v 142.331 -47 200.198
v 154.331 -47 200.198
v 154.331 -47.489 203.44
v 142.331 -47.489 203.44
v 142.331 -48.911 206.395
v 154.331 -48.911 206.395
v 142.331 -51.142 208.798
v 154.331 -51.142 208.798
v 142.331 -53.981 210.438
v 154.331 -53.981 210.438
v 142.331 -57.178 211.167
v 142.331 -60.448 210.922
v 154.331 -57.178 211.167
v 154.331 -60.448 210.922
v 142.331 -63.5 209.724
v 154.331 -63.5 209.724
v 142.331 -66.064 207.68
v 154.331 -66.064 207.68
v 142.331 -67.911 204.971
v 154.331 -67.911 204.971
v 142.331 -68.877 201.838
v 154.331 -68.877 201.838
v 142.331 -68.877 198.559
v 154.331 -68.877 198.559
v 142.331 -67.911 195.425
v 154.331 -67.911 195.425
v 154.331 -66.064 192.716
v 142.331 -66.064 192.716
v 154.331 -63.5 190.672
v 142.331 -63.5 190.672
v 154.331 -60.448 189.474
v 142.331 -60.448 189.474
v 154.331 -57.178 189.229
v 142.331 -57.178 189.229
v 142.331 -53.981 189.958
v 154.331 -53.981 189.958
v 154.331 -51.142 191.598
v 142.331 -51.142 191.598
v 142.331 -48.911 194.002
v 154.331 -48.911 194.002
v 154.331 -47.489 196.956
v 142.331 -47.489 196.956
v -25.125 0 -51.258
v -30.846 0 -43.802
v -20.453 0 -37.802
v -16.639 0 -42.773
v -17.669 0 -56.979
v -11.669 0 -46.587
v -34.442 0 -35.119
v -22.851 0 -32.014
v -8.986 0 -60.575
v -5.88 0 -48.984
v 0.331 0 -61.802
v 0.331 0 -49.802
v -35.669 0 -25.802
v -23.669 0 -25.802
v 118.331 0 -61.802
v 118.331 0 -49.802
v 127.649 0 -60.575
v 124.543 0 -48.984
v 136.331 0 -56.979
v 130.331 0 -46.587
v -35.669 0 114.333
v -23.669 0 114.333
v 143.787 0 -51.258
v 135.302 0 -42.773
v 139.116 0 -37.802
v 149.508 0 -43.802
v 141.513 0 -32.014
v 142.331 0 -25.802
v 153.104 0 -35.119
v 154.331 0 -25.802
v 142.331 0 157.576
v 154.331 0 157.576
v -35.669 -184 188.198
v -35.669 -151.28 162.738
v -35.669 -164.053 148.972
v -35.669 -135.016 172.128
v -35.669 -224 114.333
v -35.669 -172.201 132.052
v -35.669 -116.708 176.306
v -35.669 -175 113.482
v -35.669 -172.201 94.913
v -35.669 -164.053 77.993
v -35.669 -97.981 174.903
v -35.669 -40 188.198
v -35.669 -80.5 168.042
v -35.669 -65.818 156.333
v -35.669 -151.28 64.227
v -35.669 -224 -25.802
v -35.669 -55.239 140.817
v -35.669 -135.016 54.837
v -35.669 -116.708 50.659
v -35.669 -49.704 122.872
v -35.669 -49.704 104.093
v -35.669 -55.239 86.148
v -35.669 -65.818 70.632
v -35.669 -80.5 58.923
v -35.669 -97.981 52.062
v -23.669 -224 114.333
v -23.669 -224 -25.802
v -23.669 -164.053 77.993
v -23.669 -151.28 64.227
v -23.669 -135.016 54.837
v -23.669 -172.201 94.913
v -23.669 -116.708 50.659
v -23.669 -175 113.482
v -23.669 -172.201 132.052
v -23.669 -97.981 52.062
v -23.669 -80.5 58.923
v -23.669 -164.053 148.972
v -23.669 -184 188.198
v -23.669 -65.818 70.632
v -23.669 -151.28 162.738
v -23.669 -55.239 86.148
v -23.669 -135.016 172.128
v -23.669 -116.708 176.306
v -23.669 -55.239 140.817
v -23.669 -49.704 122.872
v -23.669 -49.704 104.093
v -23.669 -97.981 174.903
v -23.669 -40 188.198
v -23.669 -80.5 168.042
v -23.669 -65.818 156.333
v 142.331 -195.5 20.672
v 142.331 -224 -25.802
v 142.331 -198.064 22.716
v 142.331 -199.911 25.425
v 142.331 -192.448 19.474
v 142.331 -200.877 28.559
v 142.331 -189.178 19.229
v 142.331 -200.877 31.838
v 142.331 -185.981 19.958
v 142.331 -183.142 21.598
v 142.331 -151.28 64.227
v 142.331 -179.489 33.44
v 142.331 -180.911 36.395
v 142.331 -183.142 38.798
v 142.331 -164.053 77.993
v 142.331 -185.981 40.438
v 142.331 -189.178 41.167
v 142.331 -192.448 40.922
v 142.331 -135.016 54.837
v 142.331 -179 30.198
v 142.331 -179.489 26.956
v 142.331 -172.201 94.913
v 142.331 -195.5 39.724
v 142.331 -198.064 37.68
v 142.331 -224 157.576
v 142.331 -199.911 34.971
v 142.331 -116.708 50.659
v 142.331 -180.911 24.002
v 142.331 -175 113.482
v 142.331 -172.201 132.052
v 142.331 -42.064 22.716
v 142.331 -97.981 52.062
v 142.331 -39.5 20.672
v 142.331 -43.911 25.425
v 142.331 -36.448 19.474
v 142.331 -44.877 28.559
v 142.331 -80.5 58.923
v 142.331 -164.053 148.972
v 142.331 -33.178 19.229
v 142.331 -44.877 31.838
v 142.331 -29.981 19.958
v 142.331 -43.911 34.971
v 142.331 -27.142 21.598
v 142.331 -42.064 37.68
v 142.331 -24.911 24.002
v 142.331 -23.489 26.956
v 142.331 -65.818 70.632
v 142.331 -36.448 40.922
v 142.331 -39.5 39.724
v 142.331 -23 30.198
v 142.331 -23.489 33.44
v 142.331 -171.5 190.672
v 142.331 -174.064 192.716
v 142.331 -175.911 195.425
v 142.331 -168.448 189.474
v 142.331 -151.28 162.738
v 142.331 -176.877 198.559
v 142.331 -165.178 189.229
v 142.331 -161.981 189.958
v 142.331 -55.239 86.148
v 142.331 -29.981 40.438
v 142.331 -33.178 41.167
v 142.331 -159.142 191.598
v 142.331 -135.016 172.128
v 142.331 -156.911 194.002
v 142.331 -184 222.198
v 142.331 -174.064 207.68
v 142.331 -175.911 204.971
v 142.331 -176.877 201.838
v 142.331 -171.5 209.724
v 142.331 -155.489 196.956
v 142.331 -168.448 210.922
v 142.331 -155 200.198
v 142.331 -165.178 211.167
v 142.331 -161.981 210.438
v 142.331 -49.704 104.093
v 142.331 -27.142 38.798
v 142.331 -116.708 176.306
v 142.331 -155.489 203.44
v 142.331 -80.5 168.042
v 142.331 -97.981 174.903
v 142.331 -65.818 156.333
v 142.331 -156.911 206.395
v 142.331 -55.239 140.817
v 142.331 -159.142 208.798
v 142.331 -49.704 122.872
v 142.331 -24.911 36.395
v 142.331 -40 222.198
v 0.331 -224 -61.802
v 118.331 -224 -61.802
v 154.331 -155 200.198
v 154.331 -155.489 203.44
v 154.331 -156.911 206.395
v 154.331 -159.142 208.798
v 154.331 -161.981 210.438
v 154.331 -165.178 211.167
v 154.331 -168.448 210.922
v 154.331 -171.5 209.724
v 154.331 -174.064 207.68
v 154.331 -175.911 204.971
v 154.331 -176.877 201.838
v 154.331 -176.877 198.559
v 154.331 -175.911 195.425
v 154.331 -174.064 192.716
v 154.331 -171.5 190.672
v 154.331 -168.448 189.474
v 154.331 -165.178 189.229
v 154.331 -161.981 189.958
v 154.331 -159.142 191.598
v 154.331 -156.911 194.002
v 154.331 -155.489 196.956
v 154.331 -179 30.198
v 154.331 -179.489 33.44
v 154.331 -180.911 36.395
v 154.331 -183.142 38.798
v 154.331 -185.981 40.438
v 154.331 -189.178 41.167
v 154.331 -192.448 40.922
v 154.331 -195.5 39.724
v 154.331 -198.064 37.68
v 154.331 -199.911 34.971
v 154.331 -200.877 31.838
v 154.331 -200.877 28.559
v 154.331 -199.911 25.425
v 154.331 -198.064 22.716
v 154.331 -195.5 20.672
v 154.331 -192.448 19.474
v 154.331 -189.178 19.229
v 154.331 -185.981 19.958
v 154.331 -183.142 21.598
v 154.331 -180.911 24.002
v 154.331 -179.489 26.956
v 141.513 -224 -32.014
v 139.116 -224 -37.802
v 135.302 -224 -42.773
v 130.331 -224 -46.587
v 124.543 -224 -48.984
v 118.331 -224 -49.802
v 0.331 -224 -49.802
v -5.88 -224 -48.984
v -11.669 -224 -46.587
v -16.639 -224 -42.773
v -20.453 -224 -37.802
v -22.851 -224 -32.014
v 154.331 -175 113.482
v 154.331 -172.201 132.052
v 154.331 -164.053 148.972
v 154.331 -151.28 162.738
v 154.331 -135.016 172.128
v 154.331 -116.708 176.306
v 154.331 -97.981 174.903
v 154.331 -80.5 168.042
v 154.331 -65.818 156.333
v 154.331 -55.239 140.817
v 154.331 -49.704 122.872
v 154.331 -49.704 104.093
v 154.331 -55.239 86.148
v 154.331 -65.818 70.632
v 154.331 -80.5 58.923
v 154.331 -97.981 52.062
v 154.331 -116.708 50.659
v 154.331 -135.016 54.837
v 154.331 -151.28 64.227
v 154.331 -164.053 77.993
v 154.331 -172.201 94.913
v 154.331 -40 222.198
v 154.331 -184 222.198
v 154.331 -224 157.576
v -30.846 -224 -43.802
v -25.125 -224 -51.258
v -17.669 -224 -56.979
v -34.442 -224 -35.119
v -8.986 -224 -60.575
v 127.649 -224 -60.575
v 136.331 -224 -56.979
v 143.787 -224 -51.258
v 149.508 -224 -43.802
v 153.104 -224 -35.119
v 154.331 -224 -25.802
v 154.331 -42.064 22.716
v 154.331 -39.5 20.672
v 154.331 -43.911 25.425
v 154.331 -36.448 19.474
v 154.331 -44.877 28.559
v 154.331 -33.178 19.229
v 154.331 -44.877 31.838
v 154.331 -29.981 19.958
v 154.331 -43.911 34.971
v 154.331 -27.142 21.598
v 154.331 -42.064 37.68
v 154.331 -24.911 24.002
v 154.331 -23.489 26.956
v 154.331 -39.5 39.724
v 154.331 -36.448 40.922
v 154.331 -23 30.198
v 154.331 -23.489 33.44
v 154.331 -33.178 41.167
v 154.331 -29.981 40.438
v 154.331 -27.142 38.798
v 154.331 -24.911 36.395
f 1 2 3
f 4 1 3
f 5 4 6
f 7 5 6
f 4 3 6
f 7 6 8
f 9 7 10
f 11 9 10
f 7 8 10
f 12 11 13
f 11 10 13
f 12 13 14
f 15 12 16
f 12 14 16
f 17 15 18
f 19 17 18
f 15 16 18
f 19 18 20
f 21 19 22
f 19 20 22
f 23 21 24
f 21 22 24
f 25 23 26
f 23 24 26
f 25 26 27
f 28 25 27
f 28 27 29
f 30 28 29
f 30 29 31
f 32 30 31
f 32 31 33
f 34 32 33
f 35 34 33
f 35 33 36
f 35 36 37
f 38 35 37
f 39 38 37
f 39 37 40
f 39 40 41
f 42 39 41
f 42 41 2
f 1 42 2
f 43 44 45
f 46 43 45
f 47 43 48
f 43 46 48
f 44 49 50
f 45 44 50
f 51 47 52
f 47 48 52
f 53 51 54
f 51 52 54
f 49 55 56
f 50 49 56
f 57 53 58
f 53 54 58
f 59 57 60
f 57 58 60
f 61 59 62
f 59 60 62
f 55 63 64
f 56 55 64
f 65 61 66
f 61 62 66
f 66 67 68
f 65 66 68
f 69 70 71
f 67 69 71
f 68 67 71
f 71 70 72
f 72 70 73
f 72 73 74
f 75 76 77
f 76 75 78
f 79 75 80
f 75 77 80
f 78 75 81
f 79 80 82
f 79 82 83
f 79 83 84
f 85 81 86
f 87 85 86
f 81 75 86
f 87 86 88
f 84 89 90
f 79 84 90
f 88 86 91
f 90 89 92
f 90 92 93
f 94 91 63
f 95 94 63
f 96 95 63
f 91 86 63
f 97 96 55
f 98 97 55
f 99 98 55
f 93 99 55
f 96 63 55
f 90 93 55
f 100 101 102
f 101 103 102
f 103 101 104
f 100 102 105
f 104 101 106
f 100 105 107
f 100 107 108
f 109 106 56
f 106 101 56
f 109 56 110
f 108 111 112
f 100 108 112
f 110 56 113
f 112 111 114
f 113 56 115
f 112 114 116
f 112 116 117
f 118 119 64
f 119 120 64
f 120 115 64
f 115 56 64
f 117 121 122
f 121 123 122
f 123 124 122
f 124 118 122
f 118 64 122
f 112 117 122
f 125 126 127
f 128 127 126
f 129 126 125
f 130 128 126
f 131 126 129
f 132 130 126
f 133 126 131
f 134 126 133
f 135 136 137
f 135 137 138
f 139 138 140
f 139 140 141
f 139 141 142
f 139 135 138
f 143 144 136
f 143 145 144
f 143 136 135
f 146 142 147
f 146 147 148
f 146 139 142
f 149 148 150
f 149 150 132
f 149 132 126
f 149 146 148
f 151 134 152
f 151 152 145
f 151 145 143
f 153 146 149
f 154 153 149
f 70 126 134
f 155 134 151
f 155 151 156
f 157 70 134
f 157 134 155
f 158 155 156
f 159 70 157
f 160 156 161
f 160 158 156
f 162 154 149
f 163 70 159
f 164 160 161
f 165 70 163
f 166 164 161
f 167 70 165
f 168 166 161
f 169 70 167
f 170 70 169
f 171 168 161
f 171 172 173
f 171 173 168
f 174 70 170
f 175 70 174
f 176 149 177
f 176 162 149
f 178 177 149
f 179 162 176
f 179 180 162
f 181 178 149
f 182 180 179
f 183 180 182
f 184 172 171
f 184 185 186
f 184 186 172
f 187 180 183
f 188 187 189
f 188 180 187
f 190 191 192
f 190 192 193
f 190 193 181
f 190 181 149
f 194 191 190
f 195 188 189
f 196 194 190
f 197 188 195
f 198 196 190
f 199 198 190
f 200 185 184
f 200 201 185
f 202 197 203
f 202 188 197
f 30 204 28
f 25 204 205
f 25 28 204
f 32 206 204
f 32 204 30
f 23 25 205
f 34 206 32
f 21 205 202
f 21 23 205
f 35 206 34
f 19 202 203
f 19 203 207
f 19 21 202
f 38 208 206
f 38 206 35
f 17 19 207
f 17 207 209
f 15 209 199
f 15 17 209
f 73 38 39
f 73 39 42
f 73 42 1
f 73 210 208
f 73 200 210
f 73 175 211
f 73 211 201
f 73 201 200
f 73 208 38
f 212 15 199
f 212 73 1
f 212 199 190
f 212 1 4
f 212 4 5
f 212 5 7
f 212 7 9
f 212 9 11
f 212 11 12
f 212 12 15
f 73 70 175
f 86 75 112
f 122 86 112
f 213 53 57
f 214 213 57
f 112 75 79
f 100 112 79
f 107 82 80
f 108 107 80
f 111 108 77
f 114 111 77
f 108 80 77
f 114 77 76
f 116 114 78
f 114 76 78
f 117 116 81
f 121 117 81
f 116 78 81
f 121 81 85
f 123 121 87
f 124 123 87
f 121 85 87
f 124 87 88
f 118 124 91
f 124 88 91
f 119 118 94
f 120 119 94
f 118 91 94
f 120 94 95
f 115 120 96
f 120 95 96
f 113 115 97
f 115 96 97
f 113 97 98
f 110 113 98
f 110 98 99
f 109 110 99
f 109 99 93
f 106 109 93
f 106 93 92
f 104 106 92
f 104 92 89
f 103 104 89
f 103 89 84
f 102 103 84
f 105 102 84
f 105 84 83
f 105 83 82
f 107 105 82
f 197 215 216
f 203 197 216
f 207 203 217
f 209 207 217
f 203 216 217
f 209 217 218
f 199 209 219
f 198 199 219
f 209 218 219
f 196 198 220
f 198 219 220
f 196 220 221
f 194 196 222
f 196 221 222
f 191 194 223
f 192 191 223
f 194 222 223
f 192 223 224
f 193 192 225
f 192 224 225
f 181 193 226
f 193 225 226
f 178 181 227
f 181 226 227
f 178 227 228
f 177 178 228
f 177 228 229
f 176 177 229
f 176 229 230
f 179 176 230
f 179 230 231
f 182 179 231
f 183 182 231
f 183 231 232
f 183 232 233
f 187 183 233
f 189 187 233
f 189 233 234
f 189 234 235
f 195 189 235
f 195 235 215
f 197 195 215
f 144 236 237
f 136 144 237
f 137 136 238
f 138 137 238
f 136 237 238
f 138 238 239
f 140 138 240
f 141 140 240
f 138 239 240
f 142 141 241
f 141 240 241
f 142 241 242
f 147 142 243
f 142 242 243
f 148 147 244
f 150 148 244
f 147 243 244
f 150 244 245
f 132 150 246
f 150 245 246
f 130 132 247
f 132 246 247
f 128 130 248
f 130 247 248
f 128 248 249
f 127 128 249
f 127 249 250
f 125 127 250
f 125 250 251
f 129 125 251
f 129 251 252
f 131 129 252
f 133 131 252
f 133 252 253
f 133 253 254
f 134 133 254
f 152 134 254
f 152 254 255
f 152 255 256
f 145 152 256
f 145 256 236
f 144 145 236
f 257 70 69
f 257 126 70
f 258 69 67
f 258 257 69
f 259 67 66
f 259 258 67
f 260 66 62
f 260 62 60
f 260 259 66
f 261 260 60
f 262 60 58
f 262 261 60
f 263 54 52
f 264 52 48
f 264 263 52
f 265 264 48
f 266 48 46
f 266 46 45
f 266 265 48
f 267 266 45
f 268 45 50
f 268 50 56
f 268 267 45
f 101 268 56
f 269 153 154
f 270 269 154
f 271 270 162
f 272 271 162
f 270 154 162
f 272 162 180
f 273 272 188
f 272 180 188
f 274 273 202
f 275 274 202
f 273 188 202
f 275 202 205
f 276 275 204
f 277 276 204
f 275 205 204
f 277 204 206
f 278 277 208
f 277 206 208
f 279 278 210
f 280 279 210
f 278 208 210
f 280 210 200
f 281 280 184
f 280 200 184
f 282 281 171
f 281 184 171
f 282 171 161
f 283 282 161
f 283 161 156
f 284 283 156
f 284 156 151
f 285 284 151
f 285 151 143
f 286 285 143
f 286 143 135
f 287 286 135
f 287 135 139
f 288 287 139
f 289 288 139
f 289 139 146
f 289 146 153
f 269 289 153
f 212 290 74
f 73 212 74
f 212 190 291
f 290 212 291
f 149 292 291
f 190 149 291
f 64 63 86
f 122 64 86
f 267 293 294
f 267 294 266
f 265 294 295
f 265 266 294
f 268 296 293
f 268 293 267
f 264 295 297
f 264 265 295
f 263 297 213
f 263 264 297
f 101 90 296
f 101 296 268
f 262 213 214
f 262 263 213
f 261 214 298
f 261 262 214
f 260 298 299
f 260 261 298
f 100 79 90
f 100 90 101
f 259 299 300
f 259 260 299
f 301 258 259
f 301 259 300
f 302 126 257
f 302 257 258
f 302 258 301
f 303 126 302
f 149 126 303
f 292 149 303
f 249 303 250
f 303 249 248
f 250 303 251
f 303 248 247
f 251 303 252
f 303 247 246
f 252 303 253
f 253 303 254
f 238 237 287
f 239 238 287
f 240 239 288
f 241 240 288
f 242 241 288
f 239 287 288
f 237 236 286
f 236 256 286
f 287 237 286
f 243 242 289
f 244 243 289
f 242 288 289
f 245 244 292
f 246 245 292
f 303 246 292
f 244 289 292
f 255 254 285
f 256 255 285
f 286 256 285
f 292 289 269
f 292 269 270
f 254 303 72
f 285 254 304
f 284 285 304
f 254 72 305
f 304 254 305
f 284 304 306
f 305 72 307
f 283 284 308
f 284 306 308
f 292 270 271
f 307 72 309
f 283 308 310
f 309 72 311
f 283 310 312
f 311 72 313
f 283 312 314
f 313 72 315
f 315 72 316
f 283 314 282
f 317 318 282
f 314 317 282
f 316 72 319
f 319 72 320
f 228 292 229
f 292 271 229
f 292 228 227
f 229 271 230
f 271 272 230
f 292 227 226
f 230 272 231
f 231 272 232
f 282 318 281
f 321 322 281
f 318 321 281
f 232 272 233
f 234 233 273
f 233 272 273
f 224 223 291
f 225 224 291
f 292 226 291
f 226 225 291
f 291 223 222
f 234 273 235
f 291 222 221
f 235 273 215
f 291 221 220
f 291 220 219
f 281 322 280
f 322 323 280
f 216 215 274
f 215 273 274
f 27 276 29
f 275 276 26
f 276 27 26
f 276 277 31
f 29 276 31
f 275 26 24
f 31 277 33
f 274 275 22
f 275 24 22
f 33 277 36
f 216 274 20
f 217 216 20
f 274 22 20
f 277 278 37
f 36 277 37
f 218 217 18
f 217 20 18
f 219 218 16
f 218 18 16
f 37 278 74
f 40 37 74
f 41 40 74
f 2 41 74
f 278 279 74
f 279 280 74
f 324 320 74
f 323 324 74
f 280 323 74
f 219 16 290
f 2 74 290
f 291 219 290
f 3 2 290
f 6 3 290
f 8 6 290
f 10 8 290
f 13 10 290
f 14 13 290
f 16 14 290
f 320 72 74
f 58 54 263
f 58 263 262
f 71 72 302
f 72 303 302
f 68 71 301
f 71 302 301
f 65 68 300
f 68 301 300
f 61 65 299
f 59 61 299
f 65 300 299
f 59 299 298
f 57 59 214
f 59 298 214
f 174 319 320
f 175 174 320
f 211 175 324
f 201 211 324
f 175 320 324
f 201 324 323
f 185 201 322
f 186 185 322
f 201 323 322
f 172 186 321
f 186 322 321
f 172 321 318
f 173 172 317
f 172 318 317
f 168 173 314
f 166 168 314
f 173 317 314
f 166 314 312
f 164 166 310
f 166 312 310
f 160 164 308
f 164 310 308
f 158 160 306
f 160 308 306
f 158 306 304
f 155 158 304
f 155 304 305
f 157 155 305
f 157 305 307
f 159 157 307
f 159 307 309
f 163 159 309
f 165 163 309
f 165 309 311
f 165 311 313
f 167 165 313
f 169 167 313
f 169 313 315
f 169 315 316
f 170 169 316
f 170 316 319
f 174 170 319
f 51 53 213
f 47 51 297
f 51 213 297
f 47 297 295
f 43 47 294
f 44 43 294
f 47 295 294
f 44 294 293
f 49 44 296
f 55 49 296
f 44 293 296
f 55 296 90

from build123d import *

# Parameters (mm, degrees)
F0_W      = 12
F0_H      = 238
F0_H_2    = 12
F0_W_2    = 166
F0_H_3    = 272
F1_DEPTH  = 224
F2_R      = 24
F3_R      = 36
F5_DEPTH  = 12
F7_DEPTH  = 12
F8_R      = 63
F9_DEPTH  = 190
F10_R     = 11
F11_DEPTH = 25


with BuildPart() as f1:
    # F0 (on Front) → F1 (new body)
    with BuildSketch(Plane.XZ):
        with Locations((-29.668833, 69.198049)):
            Rectangle(F0_W, F0_H)
        with Locations((-29.668833, -55.801951)):
            Rectangle(F0_W, F0_H_2)
        with Locations((59.331167, -55.801951)):
            Rectangle(F0_W_2, F0_H_2)
        with Locations((148.331167, 86.198049)):
            Rectangle(F0_W, F0_H_3)
        with Locations((148.331167, -55.801951)):
            Rectangle(F0_W, F0_H_2)
    extrude(amount=F1_DEPTH)

    # F2
    f2_edges = [f1.edges().sort_by_distance(p)[0] for p in [
        (-23.668833, -112, -49.801951),
        (142.331167, -112, -49.801951),
    ]]
    fillet(f2_edges, radius=F2_R)

    # F3
    f3_edges = [f1.edges().sort_by_distance(p)[0] for p in [
        (154.331167, -112, -61.801951),
        (-35.668833, -112, -61.801951),
    ]]
    fillet(f3_edges, radius=F3_R)

    # F4 (on face) → F5 (cut)
    with BuildSketch(Plane(origin=(-35.668833, 0, 0), x_dir=(0, -1, 0), z_dir=(-1, 0, 0))):
        Polygon((0, 114.333307), (40, 188.198049), (0, 188.198049), align=None)
        Polygon((224, 188.198049), (184, 188.198049), (224, 114.333307), align=None)
    extrude(amount=-F5_DEPTH, mode=Mode.SUBTRACT)

    # F6 (on face) → F7 (cut)
    with BuildSketch(Plane.YZ.offset(154.331167)):
        Polygon((-224, 222.198049), (-224, 157.576071), (-184, 222.198049), align=None)
        Polygon((0, 222.198049), (-40, 222.198049), (0, 157.576071), align=None)
    extrude(amount=-F7_DEPTH, mode=Mode.SUBTRACT)

    # F8 (on face) → F9 (cut)
    with BuildSketch(Plane(origin=(-35.668833, 0, 0), x_dir=(0, -1, 0), z_dir=(-1, 0, 0))):
        with Locations((112, 113.482498)):
            Circle(F8_R)
    extrude(amount=-F9_DEPTH, mode=Mode.SUBTRACT)

    # F10 (on face) → F11 (cut)
    with BuildSketch(Plane.YZ.offset(154.331167)):
        with Locations((-166, 200.198049)):
            Circle(F10_R)
        with Locations((-58, 200.198049)):
            Circle(F10_R)
        with Locations((-34, 30.198049)):
            Circle(F10_R)
        with Locations((-190, 30.198049)):
            Circle(F10_R)
    extrude(amount=-F11_DEPTH, mode=Mode.SUBTRACT)


solid = f1.part
